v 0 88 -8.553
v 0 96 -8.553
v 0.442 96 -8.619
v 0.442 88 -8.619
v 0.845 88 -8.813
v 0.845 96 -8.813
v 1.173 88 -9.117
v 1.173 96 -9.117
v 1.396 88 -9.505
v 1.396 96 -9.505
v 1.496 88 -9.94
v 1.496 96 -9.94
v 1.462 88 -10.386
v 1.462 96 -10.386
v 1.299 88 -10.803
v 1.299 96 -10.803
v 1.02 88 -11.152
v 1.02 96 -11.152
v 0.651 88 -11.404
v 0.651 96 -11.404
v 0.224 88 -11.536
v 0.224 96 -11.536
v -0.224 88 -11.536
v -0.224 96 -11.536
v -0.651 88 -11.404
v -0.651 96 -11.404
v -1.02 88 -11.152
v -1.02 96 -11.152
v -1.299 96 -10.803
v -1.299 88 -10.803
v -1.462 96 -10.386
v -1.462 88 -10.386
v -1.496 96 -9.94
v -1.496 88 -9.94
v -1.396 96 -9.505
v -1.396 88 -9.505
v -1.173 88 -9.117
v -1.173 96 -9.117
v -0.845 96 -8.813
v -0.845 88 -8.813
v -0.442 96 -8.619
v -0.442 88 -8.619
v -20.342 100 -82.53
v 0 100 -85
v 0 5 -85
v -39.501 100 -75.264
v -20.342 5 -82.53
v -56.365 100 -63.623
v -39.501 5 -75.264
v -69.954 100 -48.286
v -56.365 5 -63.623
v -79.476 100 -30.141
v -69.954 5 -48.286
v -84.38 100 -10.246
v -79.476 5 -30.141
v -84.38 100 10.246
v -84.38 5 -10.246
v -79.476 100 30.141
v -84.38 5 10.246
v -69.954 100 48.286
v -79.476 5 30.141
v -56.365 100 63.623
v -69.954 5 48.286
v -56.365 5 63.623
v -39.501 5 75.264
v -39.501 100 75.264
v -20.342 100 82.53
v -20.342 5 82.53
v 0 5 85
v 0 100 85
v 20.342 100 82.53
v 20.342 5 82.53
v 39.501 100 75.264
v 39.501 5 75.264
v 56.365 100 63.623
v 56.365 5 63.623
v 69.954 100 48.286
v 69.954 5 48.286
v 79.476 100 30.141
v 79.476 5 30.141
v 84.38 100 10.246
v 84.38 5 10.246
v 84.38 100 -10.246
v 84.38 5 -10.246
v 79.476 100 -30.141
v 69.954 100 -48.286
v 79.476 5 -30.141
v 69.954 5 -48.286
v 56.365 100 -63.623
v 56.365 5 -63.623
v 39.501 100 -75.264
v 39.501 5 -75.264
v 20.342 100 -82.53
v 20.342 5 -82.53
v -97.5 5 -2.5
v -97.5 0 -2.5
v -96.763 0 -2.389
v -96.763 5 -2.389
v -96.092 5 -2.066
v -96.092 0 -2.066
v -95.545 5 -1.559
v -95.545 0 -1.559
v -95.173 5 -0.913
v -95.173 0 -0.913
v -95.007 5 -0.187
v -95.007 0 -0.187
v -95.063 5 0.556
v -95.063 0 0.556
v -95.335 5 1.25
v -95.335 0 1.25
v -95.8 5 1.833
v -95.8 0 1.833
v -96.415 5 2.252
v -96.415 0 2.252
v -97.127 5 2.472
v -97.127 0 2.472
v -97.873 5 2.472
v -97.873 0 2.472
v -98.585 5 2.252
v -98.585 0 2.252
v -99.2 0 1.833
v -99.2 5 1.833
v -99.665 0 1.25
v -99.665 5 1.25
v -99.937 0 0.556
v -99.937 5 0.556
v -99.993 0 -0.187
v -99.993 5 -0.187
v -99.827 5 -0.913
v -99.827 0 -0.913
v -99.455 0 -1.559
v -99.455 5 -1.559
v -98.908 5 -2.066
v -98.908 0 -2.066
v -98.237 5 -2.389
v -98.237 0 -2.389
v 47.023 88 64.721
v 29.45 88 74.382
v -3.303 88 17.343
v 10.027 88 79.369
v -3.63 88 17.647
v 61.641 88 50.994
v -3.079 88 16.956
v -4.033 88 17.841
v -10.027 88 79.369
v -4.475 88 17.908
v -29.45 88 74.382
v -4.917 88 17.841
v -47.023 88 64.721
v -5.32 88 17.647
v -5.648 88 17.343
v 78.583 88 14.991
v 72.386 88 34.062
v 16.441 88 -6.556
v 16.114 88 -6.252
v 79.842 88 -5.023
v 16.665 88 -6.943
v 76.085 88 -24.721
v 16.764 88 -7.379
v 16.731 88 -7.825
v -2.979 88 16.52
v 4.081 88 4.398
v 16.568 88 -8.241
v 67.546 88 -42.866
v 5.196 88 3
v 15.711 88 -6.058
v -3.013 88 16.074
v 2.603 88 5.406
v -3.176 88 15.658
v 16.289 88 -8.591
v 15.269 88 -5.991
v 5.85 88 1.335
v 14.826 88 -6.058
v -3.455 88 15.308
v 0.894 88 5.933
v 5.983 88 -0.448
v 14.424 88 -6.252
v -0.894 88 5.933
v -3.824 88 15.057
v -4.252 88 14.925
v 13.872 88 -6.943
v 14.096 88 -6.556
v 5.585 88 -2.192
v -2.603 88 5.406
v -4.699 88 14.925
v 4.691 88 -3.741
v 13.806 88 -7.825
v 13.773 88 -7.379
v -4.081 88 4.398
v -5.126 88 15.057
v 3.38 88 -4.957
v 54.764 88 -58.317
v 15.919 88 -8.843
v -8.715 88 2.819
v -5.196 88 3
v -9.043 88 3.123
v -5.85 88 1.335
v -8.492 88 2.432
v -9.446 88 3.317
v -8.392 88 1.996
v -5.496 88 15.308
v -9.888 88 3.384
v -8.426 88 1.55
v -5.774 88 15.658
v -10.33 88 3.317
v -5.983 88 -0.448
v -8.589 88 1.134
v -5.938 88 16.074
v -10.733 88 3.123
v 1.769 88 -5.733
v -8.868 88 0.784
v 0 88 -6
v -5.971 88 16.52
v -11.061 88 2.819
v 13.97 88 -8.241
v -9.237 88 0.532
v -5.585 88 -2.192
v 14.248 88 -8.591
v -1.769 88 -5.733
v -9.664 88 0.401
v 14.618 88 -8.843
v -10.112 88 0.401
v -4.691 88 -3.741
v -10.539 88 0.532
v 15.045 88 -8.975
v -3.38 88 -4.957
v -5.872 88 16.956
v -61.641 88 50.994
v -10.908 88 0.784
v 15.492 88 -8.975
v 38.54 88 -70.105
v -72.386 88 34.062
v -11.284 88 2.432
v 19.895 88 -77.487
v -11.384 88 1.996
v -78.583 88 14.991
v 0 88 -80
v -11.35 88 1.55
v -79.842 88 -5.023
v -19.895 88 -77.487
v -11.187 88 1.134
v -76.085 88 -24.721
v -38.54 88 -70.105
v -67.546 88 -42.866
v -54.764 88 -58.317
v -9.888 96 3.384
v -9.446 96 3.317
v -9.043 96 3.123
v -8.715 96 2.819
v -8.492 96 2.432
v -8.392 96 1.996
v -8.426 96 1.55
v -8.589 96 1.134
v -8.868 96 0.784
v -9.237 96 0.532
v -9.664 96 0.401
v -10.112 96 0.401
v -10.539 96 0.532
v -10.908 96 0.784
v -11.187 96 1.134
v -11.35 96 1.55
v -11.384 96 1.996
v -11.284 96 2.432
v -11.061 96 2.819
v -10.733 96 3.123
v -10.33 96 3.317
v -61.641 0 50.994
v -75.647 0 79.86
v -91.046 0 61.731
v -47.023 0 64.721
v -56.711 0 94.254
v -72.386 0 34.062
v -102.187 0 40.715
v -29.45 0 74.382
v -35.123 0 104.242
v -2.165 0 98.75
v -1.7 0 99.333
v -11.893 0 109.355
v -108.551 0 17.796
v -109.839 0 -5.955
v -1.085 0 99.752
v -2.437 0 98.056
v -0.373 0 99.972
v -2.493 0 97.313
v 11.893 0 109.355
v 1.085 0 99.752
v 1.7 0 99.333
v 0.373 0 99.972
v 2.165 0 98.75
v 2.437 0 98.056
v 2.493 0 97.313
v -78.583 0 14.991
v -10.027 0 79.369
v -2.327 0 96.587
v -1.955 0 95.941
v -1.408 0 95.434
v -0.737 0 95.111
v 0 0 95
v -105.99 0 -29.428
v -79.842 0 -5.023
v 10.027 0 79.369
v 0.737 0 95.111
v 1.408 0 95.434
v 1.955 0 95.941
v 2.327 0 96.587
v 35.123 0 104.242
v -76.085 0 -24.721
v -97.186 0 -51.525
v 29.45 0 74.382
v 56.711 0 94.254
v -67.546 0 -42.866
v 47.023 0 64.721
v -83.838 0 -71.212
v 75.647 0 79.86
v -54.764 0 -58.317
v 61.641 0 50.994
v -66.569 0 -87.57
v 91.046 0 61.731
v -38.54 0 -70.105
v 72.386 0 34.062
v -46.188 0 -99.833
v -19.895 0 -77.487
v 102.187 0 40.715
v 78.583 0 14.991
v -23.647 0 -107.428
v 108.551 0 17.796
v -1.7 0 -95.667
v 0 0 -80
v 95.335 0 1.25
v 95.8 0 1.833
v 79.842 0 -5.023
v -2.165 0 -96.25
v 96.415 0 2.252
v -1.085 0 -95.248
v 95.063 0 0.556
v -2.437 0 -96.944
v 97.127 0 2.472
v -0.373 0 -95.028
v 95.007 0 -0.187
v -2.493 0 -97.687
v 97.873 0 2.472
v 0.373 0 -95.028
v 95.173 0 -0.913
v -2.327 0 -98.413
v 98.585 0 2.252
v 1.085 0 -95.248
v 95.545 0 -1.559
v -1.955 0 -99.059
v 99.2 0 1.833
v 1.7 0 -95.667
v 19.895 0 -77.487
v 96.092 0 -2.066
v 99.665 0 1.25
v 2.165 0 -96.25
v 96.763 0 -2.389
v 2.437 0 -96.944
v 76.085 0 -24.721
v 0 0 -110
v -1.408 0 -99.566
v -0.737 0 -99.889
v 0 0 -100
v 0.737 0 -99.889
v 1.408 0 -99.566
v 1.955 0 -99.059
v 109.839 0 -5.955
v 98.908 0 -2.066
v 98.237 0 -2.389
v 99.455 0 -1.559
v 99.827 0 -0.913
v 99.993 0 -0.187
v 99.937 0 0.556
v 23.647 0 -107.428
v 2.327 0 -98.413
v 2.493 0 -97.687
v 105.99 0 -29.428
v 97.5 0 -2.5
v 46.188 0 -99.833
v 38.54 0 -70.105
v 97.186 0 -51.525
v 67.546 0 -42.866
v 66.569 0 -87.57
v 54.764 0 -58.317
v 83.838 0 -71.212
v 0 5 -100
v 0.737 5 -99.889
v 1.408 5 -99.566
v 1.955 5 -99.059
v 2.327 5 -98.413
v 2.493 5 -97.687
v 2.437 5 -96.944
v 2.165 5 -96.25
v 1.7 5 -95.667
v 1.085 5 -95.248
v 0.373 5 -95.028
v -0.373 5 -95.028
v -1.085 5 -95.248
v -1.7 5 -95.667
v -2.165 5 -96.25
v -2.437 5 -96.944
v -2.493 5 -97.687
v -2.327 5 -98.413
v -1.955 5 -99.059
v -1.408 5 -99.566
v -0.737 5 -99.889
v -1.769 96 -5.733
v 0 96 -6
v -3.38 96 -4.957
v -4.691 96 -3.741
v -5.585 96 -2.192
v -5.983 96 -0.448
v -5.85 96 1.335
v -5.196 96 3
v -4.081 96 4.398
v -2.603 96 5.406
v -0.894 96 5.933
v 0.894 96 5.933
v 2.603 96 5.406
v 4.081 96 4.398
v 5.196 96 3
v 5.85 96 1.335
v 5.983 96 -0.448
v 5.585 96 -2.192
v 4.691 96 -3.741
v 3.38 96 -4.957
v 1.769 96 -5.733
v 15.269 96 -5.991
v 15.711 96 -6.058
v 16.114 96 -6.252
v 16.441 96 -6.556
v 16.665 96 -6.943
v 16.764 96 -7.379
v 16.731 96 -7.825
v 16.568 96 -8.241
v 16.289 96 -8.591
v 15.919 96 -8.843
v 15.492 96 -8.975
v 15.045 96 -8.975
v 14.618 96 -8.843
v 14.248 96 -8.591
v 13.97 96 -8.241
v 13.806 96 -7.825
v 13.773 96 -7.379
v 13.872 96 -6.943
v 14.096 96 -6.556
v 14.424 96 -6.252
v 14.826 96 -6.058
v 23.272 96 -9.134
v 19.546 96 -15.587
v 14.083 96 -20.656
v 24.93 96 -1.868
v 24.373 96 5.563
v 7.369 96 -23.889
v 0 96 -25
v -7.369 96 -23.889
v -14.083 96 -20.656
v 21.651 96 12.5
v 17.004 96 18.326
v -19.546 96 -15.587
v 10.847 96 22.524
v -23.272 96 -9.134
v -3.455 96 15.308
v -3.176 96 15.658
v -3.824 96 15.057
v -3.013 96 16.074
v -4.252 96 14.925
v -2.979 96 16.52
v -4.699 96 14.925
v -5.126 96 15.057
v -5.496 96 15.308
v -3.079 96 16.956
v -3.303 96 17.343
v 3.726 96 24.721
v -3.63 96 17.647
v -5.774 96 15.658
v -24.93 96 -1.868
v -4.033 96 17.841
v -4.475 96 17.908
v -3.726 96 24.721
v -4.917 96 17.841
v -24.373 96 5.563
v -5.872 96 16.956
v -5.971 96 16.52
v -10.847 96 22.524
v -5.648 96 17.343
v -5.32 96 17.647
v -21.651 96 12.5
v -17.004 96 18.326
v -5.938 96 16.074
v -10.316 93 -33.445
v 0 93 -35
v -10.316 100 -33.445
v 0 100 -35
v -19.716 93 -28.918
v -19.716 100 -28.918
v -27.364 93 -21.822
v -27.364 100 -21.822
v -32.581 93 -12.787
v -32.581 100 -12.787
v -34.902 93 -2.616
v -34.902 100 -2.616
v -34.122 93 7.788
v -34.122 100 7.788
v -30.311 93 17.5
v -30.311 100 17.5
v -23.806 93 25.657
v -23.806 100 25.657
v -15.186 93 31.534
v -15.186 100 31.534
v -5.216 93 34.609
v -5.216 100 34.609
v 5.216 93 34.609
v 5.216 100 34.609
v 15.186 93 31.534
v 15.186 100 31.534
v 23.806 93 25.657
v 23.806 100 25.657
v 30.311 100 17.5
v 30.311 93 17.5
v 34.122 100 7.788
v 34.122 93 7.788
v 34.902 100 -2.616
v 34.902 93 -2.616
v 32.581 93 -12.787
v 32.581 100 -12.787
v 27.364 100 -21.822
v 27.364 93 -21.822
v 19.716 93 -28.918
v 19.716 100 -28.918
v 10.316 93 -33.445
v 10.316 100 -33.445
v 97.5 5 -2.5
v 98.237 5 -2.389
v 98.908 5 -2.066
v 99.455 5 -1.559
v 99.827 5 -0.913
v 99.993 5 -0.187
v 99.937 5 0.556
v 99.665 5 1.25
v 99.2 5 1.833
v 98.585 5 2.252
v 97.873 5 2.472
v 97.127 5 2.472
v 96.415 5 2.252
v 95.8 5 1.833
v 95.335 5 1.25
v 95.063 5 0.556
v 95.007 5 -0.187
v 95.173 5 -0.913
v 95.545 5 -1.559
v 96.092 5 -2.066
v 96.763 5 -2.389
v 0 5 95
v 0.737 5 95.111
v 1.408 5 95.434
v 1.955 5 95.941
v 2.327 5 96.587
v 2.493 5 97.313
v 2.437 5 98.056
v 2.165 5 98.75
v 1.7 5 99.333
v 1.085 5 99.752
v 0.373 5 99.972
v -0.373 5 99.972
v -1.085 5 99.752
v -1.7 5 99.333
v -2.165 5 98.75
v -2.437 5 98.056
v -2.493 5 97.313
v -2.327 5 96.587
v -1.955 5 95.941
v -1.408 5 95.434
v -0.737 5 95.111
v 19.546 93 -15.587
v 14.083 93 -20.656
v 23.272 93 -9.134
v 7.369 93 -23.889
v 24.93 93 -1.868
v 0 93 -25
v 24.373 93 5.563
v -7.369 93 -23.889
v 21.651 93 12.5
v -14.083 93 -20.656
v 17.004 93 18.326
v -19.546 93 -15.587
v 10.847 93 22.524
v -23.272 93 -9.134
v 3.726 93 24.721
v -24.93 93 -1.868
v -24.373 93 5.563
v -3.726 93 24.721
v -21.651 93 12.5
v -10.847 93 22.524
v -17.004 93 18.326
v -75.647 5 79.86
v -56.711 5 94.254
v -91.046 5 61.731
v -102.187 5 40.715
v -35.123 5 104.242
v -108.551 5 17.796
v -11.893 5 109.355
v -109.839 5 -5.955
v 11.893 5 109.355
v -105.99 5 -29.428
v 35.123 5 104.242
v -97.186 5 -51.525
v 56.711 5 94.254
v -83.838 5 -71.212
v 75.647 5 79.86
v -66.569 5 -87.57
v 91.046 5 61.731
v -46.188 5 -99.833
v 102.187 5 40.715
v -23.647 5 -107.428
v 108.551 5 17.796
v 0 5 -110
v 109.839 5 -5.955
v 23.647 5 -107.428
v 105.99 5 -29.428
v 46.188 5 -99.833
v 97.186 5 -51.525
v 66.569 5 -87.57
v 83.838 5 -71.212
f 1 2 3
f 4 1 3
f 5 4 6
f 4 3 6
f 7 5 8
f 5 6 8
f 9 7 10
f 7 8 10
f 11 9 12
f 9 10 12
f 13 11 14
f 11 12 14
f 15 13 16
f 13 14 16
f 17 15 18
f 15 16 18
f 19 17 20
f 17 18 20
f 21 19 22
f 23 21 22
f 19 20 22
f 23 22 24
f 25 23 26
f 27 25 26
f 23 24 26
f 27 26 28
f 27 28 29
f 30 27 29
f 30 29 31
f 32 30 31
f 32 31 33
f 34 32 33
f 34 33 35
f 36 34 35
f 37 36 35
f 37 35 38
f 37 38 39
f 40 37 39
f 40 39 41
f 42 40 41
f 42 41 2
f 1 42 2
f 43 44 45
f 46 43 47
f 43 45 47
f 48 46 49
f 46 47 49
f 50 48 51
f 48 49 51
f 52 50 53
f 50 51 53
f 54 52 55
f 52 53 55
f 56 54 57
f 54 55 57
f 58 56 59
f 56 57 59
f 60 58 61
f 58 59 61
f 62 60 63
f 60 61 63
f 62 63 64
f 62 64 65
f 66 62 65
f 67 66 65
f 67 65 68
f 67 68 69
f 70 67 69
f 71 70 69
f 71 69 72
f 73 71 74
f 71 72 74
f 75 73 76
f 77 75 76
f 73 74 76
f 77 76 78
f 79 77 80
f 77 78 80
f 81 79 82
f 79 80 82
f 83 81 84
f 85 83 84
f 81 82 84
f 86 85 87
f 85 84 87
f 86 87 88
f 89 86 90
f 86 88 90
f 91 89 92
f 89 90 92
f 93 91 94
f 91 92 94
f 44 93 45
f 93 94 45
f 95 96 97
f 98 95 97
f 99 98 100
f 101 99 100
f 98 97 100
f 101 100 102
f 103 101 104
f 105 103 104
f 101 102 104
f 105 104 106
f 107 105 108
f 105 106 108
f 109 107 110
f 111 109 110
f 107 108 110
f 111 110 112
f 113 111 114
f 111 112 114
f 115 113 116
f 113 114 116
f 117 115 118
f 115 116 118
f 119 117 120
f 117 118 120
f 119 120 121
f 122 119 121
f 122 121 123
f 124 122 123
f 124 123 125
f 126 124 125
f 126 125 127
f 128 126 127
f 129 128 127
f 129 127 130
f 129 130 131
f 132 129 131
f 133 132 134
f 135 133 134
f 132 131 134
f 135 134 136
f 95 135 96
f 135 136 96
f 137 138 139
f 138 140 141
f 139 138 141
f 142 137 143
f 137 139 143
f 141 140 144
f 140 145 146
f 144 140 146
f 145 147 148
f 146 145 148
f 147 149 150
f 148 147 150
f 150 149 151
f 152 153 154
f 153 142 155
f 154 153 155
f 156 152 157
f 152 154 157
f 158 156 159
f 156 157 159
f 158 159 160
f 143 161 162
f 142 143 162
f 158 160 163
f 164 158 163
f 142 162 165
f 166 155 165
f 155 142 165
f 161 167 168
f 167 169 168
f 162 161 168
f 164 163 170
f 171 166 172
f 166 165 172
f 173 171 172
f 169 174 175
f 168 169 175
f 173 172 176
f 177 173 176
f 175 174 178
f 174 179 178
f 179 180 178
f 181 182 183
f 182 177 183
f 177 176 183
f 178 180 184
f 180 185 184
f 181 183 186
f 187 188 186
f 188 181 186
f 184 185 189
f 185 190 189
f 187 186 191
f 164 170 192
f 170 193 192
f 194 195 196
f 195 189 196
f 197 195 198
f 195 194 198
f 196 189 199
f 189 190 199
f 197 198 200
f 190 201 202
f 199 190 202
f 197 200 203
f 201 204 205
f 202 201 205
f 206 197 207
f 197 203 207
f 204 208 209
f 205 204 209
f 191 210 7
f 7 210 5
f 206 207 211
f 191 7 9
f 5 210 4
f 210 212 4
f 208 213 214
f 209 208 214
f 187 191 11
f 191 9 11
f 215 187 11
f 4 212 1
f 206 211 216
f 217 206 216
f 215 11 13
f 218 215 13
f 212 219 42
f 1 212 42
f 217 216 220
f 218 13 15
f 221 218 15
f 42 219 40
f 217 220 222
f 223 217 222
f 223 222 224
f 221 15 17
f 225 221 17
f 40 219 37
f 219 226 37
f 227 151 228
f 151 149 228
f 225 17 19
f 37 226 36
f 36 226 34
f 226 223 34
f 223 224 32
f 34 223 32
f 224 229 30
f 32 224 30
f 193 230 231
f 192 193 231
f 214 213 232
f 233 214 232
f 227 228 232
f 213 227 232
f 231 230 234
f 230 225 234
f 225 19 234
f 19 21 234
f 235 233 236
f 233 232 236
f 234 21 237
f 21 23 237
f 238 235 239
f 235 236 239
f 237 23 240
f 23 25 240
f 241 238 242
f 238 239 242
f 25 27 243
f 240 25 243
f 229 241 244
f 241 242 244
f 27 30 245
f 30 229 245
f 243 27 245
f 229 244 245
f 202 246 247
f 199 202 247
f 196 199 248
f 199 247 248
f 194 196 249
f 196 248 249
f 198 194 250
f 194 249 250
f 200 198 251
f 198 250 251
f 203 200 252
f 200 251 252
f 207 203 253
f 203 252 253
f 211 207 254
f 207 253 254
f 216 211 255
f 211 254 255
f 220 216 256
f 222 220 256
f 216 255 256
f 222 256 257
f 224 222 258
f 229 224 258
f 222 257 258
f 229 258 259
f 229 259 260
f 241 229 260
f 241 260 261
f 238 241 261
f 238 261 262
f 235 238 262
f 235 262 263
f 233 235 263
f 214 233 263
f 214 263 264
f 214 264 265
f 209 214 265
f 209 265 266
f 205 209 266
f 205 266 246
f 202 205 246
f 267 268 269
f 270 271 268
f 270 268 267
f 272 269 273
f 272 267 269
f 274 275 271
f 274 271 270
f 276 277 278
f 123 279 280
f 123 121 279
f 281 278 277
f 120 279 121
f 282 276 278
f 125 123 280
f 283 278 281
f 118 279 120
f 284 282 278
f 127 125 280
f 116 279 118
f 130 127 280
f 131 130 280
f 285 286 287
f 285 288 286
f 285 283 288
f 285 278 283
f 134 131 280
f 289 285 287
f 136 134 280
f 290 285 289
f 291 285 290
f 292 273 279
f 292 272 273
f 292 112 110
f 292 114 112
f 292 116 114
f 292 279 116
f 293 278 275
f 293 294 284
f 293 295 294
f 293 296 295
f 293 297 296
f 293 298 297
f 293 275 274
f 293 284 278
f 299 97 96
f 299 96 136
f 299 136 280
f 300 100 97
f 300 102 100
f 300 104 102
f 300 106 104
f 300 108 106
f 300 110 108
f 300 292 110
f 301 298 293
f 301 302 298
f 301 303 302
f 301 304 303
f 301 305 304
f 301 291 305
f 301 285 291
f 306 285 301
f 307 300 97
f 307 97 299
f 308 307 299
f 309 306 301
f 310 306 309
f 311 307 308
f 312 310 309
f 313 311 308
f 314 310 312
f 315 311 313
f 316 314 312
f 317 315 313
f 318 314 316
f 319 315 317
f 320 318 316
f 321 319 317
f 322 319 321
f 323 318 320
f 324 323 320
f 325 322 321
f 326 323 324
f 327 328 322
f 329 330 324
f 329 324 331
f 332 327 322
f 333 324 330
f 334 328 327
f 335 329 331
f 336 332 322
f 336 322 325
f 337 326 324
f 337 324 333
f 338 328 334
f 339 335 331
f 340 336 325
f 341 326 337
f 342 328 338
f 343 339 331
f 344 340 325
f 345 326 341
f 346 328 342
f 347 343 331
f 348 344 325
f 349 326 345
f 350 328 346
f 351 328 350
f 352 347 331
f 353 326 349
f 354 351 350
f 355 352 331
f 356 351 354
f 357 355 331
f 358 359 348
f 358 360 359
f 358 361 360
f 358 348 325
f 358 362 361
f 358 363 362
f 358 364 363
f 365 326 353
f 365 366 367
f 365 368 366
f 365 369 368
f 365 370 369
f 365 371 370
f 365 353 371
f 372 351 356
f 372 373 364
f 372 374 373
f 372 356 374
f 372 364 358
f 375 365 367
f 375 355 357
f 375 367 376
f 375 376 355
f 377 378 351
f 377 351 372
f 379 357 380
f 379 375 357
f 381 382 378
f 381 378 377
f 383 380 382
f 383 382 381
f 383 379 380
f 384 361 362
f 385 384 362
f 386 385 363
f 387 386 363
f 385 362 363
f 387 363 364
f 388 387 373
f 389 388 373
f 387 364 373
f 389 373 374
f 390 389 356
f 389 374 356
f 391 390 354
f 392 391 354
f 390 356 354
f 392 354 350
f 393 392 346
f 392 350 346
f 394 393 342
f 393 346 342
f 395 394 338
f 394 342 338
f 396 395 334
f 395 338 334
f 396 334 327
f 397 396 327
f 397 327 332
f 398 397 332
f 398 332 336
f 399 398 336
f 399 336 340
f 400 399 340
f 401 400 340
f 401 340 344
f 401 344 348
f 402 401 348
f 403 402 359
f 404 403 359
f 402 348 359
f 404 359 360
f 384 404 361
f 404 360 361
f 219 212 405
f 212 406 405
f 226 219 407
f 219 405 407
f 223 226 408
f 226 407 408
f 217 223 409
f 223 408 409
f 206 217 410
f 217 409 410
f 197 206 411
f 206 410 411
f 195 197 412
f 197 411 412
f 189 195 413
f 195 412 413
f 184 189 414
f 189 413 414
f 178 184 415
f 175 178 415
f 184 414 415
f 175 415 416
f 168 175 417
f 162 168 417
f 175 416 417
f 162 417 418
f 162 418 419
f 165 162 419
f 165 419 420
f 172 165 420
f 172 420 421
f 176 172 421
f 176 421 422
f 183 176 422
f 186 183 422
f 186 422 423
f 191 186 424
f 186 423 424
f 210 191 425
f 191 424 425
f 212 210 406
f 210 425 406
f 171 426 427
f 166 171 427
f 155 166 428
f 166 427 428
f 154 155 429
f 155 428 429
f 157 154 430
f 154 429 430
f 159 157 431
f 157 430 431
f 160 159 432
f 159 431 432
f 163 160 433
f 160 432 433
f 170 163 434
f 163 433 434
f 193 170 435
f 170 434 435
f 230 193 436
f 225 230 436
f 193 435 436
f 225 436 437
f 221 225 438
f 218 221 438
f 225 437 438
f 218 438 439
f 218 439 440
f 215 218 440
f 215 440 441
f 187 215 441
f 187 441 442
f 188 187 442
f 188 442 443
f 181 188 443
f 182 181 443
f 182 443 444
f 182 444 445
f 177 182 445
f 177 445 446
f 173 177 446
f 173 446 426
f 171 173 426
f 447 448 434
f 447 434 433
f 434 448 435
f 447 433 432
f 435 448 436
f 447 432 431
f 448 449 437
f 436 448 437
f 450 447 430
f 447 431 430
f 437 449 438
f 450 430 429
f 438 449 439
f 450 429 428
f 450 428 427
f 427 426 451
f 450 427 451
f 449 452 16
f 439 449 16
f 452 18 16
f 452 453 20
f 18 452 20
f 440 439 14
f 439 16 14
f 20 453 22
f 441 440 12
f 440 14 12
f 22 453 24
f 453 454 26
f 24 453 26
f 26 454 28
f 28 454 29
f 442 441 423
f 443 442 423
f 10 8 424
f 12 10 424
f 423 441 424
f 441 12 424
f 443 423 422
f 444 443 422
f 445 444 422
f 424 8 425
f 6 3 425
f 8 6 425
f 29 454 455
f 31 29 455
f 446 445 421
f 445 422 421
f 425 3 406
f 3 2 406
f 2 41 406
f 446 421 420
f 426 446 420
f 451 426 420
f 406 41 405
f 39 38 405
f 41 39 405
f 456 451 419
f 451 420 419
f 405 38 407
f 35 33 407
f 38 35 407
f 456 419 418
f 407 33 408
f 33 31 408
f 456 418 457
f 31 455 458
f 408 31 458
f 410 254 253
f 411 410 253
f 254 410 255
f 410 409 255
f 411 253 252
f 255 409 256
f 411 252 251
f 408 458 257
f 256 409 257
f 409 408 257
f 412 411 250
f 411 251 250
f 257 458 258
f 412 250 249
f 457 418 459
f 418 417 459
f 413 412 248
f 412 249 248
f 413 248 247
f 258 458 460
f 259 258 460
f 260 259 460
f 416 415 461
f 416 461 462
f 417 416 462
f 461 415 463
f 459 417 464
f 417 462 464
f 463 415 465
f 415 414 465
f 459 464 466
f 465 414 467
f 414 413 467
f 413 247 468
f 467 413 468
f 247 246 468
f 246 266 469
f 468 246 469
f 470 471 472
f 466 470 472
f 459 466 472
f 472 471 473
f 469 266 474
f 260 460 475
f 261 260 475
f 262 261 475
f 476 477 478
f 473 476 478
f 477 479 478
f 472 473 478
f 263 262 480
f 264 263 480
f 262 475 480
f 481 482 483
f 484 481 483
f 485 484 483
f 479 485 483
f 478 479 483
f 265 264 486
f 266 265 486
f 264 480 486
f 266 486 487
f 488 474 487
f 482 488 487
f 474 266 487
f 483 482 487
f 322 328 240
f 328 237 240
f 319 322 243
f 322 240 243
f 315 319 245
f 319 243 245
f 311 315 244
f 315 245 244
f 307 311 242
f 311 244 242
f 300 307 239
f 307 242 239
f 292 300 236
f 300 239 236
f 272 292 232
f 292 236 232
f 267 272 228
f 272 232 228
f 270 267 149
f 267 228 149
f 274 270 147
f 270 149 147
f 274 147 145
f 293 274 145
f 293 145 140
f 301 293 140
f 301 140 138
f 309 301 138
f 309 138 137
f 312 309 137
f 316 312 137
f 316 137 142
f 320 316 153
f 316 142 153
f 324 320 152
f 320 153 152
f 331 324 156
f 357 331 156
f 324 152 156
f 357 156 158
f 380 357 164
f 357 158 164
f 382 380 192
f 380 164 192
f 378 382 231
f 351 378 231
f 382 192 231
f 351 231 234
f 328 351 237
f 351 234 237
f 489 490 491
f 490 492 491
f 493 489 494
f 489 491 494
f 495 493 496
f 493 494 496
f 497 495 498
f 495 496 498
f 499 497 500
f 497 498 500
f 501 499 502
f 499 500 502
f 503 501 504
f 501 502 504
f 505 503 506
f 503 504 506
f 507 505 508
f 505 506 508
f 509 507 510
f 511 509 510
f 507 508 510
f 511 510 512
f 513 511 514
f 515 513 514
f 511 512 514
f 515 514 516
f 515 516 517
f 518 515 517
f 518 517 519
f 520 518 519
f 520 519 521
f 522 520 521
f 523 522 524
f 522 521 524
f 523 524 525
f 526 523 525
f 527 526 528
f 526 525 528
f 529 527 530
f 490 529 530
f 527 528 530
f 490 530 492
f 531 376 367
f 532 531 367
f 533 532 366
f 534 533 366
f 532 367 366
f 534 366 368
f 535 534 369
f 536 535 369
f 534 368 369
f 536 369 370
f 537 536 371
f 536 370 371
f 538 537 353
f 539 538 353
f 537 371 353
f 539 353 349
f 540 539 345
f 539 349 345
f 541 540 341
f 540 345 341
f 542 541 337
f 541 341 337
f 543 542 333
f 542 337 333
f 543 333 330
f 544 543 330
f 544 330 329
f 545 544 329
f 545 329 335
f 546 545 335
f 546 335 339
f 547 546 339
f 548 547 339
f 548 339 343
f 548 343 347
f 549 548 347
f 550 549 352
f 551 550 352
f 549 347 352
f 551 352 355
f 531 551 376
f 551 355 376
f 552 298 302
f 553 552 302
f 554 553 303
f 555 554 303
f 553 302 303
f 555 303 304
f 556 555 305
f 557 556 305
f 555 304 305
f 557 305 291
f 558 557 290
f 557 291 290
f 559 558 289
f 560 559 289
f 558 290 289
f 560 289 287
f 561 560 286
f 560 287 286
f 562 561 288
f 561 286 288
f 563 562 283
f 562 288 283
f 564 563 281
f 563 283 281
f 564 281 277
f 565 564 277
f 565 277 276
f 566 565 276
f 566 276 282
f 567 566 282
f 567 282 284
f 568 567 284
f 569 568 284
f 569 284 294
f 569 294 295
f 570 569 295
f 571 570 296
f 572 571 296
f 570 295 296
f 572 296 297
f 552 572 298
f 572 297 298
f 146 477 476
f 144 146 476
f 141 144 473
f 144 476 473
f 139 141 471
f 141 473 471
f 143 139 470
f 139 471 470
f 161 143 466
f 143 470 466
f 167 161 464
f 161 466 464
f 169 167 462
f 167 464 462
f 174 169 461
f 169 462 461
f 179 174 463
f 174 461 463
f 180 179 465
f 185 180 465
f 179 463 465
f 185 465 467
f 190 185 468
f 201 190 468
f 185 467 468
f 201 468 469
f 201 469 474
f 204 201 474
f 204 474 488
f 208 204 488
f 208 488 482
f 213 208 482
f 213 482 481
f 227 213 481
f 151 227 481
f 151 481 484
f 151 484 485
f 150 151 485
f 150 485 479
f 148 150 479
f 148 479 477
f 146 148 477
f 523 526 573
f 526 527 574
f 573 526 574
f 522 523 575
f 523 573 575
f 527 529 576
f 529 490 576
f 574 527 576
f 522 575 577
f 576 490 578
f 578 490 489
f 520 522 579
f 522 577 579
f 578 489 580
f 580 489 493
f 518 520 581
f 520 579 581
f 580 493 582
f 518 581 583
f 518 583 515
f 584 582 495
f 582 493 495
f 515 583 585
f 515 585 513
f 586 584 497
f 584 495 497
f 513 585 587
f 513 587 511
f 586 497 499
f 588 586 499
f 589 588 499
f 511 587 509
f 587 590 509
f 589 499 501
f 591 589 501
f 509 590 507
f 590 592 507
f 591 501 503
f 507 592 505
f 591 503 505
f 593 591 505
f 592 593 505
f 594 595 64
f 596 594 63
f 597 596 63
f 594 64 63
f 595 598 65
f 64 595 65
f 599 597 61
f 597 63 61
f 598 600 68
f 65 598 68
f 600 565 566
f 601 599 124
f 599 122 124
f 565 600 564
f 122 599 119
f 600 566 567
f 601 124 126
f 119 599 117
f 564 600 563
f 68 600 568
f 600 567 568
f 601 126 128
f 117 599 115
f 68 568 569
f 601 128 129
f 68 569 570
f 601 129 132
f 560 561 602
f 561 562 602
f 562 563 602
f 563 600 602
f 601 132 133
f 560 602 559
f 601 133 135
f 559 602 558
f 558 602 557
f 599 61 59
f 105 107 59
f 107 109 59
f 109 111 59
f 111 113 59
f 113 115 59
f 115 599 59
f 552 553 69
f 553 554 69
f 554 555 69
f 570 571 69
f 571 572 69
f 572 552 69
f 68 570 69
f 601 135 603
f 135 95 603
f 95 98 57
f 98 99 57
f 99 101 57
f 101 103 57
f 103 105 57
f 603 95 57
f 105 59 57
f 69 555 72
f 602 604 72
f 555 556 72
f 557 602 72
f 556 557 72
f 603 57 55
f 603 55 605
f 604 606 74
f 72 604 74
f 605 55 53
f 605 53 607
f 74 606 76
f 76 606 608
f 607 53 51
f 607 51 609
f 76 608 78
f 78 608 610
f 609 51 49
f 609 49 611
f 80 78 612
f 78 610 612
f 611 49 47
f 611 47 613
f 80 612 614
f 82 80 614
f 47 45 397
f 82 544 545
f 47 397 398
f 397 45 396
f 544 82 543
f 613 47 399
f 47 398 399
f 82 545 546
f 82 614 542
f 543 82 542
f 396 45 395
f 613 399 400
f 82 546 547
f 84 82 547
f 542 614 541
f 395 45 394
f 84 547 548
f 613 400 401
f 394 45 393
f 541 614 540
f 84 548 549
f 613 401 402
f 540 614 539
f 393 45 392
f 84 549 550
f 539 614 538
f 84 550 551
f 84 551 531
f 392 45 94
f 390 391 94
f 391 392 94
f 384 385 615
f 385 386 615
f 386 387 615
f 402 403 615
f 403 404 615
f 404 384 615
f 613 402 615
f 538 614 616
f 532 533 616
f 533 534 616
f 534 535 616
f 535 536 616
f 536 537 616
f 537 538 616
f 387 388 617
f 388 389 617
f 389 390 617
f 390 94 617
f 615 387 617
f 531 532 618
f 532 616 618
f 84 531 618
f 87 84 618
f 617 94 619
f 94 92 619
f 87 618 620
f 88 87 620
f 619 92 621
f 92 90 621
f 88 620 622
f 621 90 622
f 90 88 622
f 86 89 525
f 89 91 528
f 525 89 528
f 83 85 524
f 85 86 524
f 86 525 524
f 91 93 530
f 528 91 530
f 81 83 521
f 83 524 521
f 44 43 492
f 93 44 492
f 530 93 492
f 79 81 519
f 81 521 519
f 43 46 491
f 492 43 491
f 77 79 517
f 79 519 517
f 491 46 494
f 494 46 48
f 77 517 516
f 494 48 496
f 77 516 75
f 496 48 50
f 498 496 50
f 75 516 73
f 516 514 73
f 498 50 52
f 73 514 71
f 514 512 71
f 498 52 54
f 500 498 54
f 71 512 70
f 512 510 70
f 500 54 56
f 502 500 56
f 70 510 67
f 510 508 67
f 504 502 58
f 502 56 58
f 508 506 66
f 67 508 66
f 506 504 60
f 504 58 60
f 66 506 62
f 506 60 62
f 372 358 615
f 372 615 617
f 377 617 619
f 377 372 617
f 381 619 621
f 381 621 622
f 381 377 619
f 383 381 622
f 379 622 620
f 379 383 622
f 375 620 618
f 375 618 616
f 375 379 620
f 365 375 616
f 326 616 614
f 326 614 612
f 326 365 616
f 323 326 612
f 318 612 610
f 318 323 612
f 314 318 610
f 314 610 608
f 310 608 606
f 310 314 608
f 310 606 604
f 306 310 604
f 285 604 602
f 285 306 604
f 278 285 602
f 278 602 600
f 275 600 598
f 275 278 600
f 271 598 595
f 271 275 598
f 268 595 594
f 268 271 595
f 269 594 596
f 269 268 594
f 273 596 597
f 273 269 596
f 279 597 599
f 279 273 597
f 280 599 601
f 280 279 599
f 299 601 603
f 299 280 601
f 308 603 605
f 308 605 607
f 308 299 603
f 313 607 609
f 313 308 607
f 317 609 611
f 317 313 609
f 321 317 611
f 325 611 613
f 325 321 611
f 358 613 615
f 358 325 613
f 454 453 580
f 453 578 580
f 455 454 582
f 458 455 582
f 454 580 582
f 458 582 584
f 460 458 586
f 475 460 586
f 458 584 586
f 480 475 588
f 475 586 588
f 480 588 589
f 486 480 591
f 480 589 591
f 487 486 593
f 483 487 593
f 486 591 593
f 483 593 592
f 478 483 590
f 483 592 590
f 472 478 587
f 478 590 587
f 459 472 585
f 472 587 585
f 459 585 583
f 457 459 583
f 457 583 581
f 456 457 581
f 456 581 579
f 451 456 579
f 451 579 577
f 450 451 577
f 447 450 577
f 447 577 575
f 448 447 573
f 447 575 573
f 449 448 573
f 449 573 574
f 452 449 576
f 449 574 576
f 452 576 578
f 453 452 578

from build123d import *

# Parameters (mm, degrees)
CUT_EXTRUDE1_REACH  = 155.838
SKETCH2_R           = 1.5
SKETCH3_R           = 110
SKETCH3_R_2         = 85
SKETCH3_R_3         = 2.5
BOSS_EXTRUDE1_DEPTH = 5


with BuildPart() as part:
    # Sketch1 → Revolve1 (revolve)
    with BuildSketch(Plane.XY, mode=Mode.PRIVATE) as revolve1_sk:
        Polygon((80, 0), (80, 88), (6, 88), (6, 96), (25, 96), (25, 93), (35, 93), (35, 100), (85, 100), (85, 0), align=None)
    revolve(revolve1_sk.sketch.rotate(Axis((0, 0, 0), (0, 1, 0)), 90), axis=Axis((0, 0, 0), (0, 1, 0)))

    # Sketch2 → Cut-Extrude1 (cut, up to next)
    with BuildSketch(Plane(origin=(0, 96, 0), x_dir=(1, 0, 0), z_dir=(0, 1, 0)), mode=Mode.PRIVATE) as cut_extrude1_sk1:
        with Locations(Location((0, 10.052527236, 0), (0, 0, 270))):
            Circle(SKETCH2_R)
    cut_extrude1_tool1 = extrude(cut_extrude1_sk1.sketch, amount=-CUT_EXTRUDE1_REACH, mode=Mode.PRIVATE) & part.part
    # Sketch2 → Cut-Extrude1 (cut, up to next)
    with BuildSketch(Plane(origin=(0, 96, 0), x_dir=(1, 0, 0), z_dir=(0, 1, 0)), mode=Mode.PRIVATE) as cut_extrude1_sk2:
        with Locations(Location((-9.888059839, -1.883815278, 0), (0, 0, 270))):
            Circle(SKETCH2_R)
    cut_extrude1_tool2 = extrude(cut_extrude1_sk2.sketch, amount=-CUT_EXTRUDE1_REACH, mode=Mode.PRIVATE) & part.part
    # Sketch2 → Cut-Extrude1 (cut, up to next)
    with BuildSketch(Plane(origin=(0, 96, 0), x_dir=(1, 0, 0), z_dir=(0, 1, 0)), mode=Mode.PRIVATE) as cut_extrude1_sk3:
        with Locations(Location((-4.4752587, -16.407987676, 0), (0, 0, 270))):
            Circle(SKETCH2_R)
    cut_extrude1_tool3 = extrude(cut_extrude1_sk3.sketch, amount=-CUT_EXTRUDE1_REACH, mode=Mode.PRIVATE) & part.part
    # Sketch2 → Cut-Extrude1 (cut, up to next)
    with BuildSketch(Plane(origin=(0, 96, 0), x_dir=(1, 0, 0), z_dir=(0, 1, 0)), mode=Mode.PRIVATE) as cut_extrude1_sk4:
        with Locations(Location((15.268544691, 7.491431306, 0), (0, 0, 270))):
            Circle(SKETCH2_R)
    cut_extrude1_tool4 = extrude(cut_extrude1_sk4.sketch, amount=-CUT_EXTRUDE1_REACH, mode=Mode.PRIVATE) & part.part
    add(cut_extrude1_tool1.solids().sort_by_distance((0, 96, -10.052527))[0], mode=Mode.SUBTRACT)
    add(cut_extrude1_tool2.solids().sort_by_distance((-9.88806, 96, 1.883815))[0], mode=Mode.SUBTRACT)
    add(cut_extrude1_tool3.solids().sort_by_distance((-4.475259, 96, 16.407988))[0], mode=Mode.SUBTRACT)
    add(cut_extrude1_tool4.solids().sort_by_distance((15.268545, 96, -7.491431))[0], mode=Mode.SUBTRACT)

    # Sketch3 → Boss-Extrude1 (add)
    with BuildSketch(Plane.XZ):
        with Locations(Location((0, 0, 0), (0, 0, 270))):
            Circle(SKETCH3_R)
        with Locations(Location((0, 0, 0), (0, 0, 270))):
            Circle(SKETCH3_R_2, mode=Mode.SUBTRACT)
        with Locations(Location((0, 97.5, 0), (0, 0, 270))):
            Circle(SKETCH3_R_3, mode=Mode.SUBTRACT)
        with Locations(Location((97.5, 0, 0), (0, 0, 270))):
            Circle(SKETCH3_R_3, mode=Mode.SUBTRACT)
        with Locations(Location((0, -97.5, 0), (0, 0, 270))):
            Circle(SKETCH3_R_3, mode=Mode.SUBTRACT)
        with Locations(Location((-97.5, 0, 0), (0, 0, 270))):
            Circle(SKETCH3_R_3, mode=Mode.SUBTRACT)
    extrude(amount=-BOSS_EXTRUDE1_DEPTH)


solid = part.part
